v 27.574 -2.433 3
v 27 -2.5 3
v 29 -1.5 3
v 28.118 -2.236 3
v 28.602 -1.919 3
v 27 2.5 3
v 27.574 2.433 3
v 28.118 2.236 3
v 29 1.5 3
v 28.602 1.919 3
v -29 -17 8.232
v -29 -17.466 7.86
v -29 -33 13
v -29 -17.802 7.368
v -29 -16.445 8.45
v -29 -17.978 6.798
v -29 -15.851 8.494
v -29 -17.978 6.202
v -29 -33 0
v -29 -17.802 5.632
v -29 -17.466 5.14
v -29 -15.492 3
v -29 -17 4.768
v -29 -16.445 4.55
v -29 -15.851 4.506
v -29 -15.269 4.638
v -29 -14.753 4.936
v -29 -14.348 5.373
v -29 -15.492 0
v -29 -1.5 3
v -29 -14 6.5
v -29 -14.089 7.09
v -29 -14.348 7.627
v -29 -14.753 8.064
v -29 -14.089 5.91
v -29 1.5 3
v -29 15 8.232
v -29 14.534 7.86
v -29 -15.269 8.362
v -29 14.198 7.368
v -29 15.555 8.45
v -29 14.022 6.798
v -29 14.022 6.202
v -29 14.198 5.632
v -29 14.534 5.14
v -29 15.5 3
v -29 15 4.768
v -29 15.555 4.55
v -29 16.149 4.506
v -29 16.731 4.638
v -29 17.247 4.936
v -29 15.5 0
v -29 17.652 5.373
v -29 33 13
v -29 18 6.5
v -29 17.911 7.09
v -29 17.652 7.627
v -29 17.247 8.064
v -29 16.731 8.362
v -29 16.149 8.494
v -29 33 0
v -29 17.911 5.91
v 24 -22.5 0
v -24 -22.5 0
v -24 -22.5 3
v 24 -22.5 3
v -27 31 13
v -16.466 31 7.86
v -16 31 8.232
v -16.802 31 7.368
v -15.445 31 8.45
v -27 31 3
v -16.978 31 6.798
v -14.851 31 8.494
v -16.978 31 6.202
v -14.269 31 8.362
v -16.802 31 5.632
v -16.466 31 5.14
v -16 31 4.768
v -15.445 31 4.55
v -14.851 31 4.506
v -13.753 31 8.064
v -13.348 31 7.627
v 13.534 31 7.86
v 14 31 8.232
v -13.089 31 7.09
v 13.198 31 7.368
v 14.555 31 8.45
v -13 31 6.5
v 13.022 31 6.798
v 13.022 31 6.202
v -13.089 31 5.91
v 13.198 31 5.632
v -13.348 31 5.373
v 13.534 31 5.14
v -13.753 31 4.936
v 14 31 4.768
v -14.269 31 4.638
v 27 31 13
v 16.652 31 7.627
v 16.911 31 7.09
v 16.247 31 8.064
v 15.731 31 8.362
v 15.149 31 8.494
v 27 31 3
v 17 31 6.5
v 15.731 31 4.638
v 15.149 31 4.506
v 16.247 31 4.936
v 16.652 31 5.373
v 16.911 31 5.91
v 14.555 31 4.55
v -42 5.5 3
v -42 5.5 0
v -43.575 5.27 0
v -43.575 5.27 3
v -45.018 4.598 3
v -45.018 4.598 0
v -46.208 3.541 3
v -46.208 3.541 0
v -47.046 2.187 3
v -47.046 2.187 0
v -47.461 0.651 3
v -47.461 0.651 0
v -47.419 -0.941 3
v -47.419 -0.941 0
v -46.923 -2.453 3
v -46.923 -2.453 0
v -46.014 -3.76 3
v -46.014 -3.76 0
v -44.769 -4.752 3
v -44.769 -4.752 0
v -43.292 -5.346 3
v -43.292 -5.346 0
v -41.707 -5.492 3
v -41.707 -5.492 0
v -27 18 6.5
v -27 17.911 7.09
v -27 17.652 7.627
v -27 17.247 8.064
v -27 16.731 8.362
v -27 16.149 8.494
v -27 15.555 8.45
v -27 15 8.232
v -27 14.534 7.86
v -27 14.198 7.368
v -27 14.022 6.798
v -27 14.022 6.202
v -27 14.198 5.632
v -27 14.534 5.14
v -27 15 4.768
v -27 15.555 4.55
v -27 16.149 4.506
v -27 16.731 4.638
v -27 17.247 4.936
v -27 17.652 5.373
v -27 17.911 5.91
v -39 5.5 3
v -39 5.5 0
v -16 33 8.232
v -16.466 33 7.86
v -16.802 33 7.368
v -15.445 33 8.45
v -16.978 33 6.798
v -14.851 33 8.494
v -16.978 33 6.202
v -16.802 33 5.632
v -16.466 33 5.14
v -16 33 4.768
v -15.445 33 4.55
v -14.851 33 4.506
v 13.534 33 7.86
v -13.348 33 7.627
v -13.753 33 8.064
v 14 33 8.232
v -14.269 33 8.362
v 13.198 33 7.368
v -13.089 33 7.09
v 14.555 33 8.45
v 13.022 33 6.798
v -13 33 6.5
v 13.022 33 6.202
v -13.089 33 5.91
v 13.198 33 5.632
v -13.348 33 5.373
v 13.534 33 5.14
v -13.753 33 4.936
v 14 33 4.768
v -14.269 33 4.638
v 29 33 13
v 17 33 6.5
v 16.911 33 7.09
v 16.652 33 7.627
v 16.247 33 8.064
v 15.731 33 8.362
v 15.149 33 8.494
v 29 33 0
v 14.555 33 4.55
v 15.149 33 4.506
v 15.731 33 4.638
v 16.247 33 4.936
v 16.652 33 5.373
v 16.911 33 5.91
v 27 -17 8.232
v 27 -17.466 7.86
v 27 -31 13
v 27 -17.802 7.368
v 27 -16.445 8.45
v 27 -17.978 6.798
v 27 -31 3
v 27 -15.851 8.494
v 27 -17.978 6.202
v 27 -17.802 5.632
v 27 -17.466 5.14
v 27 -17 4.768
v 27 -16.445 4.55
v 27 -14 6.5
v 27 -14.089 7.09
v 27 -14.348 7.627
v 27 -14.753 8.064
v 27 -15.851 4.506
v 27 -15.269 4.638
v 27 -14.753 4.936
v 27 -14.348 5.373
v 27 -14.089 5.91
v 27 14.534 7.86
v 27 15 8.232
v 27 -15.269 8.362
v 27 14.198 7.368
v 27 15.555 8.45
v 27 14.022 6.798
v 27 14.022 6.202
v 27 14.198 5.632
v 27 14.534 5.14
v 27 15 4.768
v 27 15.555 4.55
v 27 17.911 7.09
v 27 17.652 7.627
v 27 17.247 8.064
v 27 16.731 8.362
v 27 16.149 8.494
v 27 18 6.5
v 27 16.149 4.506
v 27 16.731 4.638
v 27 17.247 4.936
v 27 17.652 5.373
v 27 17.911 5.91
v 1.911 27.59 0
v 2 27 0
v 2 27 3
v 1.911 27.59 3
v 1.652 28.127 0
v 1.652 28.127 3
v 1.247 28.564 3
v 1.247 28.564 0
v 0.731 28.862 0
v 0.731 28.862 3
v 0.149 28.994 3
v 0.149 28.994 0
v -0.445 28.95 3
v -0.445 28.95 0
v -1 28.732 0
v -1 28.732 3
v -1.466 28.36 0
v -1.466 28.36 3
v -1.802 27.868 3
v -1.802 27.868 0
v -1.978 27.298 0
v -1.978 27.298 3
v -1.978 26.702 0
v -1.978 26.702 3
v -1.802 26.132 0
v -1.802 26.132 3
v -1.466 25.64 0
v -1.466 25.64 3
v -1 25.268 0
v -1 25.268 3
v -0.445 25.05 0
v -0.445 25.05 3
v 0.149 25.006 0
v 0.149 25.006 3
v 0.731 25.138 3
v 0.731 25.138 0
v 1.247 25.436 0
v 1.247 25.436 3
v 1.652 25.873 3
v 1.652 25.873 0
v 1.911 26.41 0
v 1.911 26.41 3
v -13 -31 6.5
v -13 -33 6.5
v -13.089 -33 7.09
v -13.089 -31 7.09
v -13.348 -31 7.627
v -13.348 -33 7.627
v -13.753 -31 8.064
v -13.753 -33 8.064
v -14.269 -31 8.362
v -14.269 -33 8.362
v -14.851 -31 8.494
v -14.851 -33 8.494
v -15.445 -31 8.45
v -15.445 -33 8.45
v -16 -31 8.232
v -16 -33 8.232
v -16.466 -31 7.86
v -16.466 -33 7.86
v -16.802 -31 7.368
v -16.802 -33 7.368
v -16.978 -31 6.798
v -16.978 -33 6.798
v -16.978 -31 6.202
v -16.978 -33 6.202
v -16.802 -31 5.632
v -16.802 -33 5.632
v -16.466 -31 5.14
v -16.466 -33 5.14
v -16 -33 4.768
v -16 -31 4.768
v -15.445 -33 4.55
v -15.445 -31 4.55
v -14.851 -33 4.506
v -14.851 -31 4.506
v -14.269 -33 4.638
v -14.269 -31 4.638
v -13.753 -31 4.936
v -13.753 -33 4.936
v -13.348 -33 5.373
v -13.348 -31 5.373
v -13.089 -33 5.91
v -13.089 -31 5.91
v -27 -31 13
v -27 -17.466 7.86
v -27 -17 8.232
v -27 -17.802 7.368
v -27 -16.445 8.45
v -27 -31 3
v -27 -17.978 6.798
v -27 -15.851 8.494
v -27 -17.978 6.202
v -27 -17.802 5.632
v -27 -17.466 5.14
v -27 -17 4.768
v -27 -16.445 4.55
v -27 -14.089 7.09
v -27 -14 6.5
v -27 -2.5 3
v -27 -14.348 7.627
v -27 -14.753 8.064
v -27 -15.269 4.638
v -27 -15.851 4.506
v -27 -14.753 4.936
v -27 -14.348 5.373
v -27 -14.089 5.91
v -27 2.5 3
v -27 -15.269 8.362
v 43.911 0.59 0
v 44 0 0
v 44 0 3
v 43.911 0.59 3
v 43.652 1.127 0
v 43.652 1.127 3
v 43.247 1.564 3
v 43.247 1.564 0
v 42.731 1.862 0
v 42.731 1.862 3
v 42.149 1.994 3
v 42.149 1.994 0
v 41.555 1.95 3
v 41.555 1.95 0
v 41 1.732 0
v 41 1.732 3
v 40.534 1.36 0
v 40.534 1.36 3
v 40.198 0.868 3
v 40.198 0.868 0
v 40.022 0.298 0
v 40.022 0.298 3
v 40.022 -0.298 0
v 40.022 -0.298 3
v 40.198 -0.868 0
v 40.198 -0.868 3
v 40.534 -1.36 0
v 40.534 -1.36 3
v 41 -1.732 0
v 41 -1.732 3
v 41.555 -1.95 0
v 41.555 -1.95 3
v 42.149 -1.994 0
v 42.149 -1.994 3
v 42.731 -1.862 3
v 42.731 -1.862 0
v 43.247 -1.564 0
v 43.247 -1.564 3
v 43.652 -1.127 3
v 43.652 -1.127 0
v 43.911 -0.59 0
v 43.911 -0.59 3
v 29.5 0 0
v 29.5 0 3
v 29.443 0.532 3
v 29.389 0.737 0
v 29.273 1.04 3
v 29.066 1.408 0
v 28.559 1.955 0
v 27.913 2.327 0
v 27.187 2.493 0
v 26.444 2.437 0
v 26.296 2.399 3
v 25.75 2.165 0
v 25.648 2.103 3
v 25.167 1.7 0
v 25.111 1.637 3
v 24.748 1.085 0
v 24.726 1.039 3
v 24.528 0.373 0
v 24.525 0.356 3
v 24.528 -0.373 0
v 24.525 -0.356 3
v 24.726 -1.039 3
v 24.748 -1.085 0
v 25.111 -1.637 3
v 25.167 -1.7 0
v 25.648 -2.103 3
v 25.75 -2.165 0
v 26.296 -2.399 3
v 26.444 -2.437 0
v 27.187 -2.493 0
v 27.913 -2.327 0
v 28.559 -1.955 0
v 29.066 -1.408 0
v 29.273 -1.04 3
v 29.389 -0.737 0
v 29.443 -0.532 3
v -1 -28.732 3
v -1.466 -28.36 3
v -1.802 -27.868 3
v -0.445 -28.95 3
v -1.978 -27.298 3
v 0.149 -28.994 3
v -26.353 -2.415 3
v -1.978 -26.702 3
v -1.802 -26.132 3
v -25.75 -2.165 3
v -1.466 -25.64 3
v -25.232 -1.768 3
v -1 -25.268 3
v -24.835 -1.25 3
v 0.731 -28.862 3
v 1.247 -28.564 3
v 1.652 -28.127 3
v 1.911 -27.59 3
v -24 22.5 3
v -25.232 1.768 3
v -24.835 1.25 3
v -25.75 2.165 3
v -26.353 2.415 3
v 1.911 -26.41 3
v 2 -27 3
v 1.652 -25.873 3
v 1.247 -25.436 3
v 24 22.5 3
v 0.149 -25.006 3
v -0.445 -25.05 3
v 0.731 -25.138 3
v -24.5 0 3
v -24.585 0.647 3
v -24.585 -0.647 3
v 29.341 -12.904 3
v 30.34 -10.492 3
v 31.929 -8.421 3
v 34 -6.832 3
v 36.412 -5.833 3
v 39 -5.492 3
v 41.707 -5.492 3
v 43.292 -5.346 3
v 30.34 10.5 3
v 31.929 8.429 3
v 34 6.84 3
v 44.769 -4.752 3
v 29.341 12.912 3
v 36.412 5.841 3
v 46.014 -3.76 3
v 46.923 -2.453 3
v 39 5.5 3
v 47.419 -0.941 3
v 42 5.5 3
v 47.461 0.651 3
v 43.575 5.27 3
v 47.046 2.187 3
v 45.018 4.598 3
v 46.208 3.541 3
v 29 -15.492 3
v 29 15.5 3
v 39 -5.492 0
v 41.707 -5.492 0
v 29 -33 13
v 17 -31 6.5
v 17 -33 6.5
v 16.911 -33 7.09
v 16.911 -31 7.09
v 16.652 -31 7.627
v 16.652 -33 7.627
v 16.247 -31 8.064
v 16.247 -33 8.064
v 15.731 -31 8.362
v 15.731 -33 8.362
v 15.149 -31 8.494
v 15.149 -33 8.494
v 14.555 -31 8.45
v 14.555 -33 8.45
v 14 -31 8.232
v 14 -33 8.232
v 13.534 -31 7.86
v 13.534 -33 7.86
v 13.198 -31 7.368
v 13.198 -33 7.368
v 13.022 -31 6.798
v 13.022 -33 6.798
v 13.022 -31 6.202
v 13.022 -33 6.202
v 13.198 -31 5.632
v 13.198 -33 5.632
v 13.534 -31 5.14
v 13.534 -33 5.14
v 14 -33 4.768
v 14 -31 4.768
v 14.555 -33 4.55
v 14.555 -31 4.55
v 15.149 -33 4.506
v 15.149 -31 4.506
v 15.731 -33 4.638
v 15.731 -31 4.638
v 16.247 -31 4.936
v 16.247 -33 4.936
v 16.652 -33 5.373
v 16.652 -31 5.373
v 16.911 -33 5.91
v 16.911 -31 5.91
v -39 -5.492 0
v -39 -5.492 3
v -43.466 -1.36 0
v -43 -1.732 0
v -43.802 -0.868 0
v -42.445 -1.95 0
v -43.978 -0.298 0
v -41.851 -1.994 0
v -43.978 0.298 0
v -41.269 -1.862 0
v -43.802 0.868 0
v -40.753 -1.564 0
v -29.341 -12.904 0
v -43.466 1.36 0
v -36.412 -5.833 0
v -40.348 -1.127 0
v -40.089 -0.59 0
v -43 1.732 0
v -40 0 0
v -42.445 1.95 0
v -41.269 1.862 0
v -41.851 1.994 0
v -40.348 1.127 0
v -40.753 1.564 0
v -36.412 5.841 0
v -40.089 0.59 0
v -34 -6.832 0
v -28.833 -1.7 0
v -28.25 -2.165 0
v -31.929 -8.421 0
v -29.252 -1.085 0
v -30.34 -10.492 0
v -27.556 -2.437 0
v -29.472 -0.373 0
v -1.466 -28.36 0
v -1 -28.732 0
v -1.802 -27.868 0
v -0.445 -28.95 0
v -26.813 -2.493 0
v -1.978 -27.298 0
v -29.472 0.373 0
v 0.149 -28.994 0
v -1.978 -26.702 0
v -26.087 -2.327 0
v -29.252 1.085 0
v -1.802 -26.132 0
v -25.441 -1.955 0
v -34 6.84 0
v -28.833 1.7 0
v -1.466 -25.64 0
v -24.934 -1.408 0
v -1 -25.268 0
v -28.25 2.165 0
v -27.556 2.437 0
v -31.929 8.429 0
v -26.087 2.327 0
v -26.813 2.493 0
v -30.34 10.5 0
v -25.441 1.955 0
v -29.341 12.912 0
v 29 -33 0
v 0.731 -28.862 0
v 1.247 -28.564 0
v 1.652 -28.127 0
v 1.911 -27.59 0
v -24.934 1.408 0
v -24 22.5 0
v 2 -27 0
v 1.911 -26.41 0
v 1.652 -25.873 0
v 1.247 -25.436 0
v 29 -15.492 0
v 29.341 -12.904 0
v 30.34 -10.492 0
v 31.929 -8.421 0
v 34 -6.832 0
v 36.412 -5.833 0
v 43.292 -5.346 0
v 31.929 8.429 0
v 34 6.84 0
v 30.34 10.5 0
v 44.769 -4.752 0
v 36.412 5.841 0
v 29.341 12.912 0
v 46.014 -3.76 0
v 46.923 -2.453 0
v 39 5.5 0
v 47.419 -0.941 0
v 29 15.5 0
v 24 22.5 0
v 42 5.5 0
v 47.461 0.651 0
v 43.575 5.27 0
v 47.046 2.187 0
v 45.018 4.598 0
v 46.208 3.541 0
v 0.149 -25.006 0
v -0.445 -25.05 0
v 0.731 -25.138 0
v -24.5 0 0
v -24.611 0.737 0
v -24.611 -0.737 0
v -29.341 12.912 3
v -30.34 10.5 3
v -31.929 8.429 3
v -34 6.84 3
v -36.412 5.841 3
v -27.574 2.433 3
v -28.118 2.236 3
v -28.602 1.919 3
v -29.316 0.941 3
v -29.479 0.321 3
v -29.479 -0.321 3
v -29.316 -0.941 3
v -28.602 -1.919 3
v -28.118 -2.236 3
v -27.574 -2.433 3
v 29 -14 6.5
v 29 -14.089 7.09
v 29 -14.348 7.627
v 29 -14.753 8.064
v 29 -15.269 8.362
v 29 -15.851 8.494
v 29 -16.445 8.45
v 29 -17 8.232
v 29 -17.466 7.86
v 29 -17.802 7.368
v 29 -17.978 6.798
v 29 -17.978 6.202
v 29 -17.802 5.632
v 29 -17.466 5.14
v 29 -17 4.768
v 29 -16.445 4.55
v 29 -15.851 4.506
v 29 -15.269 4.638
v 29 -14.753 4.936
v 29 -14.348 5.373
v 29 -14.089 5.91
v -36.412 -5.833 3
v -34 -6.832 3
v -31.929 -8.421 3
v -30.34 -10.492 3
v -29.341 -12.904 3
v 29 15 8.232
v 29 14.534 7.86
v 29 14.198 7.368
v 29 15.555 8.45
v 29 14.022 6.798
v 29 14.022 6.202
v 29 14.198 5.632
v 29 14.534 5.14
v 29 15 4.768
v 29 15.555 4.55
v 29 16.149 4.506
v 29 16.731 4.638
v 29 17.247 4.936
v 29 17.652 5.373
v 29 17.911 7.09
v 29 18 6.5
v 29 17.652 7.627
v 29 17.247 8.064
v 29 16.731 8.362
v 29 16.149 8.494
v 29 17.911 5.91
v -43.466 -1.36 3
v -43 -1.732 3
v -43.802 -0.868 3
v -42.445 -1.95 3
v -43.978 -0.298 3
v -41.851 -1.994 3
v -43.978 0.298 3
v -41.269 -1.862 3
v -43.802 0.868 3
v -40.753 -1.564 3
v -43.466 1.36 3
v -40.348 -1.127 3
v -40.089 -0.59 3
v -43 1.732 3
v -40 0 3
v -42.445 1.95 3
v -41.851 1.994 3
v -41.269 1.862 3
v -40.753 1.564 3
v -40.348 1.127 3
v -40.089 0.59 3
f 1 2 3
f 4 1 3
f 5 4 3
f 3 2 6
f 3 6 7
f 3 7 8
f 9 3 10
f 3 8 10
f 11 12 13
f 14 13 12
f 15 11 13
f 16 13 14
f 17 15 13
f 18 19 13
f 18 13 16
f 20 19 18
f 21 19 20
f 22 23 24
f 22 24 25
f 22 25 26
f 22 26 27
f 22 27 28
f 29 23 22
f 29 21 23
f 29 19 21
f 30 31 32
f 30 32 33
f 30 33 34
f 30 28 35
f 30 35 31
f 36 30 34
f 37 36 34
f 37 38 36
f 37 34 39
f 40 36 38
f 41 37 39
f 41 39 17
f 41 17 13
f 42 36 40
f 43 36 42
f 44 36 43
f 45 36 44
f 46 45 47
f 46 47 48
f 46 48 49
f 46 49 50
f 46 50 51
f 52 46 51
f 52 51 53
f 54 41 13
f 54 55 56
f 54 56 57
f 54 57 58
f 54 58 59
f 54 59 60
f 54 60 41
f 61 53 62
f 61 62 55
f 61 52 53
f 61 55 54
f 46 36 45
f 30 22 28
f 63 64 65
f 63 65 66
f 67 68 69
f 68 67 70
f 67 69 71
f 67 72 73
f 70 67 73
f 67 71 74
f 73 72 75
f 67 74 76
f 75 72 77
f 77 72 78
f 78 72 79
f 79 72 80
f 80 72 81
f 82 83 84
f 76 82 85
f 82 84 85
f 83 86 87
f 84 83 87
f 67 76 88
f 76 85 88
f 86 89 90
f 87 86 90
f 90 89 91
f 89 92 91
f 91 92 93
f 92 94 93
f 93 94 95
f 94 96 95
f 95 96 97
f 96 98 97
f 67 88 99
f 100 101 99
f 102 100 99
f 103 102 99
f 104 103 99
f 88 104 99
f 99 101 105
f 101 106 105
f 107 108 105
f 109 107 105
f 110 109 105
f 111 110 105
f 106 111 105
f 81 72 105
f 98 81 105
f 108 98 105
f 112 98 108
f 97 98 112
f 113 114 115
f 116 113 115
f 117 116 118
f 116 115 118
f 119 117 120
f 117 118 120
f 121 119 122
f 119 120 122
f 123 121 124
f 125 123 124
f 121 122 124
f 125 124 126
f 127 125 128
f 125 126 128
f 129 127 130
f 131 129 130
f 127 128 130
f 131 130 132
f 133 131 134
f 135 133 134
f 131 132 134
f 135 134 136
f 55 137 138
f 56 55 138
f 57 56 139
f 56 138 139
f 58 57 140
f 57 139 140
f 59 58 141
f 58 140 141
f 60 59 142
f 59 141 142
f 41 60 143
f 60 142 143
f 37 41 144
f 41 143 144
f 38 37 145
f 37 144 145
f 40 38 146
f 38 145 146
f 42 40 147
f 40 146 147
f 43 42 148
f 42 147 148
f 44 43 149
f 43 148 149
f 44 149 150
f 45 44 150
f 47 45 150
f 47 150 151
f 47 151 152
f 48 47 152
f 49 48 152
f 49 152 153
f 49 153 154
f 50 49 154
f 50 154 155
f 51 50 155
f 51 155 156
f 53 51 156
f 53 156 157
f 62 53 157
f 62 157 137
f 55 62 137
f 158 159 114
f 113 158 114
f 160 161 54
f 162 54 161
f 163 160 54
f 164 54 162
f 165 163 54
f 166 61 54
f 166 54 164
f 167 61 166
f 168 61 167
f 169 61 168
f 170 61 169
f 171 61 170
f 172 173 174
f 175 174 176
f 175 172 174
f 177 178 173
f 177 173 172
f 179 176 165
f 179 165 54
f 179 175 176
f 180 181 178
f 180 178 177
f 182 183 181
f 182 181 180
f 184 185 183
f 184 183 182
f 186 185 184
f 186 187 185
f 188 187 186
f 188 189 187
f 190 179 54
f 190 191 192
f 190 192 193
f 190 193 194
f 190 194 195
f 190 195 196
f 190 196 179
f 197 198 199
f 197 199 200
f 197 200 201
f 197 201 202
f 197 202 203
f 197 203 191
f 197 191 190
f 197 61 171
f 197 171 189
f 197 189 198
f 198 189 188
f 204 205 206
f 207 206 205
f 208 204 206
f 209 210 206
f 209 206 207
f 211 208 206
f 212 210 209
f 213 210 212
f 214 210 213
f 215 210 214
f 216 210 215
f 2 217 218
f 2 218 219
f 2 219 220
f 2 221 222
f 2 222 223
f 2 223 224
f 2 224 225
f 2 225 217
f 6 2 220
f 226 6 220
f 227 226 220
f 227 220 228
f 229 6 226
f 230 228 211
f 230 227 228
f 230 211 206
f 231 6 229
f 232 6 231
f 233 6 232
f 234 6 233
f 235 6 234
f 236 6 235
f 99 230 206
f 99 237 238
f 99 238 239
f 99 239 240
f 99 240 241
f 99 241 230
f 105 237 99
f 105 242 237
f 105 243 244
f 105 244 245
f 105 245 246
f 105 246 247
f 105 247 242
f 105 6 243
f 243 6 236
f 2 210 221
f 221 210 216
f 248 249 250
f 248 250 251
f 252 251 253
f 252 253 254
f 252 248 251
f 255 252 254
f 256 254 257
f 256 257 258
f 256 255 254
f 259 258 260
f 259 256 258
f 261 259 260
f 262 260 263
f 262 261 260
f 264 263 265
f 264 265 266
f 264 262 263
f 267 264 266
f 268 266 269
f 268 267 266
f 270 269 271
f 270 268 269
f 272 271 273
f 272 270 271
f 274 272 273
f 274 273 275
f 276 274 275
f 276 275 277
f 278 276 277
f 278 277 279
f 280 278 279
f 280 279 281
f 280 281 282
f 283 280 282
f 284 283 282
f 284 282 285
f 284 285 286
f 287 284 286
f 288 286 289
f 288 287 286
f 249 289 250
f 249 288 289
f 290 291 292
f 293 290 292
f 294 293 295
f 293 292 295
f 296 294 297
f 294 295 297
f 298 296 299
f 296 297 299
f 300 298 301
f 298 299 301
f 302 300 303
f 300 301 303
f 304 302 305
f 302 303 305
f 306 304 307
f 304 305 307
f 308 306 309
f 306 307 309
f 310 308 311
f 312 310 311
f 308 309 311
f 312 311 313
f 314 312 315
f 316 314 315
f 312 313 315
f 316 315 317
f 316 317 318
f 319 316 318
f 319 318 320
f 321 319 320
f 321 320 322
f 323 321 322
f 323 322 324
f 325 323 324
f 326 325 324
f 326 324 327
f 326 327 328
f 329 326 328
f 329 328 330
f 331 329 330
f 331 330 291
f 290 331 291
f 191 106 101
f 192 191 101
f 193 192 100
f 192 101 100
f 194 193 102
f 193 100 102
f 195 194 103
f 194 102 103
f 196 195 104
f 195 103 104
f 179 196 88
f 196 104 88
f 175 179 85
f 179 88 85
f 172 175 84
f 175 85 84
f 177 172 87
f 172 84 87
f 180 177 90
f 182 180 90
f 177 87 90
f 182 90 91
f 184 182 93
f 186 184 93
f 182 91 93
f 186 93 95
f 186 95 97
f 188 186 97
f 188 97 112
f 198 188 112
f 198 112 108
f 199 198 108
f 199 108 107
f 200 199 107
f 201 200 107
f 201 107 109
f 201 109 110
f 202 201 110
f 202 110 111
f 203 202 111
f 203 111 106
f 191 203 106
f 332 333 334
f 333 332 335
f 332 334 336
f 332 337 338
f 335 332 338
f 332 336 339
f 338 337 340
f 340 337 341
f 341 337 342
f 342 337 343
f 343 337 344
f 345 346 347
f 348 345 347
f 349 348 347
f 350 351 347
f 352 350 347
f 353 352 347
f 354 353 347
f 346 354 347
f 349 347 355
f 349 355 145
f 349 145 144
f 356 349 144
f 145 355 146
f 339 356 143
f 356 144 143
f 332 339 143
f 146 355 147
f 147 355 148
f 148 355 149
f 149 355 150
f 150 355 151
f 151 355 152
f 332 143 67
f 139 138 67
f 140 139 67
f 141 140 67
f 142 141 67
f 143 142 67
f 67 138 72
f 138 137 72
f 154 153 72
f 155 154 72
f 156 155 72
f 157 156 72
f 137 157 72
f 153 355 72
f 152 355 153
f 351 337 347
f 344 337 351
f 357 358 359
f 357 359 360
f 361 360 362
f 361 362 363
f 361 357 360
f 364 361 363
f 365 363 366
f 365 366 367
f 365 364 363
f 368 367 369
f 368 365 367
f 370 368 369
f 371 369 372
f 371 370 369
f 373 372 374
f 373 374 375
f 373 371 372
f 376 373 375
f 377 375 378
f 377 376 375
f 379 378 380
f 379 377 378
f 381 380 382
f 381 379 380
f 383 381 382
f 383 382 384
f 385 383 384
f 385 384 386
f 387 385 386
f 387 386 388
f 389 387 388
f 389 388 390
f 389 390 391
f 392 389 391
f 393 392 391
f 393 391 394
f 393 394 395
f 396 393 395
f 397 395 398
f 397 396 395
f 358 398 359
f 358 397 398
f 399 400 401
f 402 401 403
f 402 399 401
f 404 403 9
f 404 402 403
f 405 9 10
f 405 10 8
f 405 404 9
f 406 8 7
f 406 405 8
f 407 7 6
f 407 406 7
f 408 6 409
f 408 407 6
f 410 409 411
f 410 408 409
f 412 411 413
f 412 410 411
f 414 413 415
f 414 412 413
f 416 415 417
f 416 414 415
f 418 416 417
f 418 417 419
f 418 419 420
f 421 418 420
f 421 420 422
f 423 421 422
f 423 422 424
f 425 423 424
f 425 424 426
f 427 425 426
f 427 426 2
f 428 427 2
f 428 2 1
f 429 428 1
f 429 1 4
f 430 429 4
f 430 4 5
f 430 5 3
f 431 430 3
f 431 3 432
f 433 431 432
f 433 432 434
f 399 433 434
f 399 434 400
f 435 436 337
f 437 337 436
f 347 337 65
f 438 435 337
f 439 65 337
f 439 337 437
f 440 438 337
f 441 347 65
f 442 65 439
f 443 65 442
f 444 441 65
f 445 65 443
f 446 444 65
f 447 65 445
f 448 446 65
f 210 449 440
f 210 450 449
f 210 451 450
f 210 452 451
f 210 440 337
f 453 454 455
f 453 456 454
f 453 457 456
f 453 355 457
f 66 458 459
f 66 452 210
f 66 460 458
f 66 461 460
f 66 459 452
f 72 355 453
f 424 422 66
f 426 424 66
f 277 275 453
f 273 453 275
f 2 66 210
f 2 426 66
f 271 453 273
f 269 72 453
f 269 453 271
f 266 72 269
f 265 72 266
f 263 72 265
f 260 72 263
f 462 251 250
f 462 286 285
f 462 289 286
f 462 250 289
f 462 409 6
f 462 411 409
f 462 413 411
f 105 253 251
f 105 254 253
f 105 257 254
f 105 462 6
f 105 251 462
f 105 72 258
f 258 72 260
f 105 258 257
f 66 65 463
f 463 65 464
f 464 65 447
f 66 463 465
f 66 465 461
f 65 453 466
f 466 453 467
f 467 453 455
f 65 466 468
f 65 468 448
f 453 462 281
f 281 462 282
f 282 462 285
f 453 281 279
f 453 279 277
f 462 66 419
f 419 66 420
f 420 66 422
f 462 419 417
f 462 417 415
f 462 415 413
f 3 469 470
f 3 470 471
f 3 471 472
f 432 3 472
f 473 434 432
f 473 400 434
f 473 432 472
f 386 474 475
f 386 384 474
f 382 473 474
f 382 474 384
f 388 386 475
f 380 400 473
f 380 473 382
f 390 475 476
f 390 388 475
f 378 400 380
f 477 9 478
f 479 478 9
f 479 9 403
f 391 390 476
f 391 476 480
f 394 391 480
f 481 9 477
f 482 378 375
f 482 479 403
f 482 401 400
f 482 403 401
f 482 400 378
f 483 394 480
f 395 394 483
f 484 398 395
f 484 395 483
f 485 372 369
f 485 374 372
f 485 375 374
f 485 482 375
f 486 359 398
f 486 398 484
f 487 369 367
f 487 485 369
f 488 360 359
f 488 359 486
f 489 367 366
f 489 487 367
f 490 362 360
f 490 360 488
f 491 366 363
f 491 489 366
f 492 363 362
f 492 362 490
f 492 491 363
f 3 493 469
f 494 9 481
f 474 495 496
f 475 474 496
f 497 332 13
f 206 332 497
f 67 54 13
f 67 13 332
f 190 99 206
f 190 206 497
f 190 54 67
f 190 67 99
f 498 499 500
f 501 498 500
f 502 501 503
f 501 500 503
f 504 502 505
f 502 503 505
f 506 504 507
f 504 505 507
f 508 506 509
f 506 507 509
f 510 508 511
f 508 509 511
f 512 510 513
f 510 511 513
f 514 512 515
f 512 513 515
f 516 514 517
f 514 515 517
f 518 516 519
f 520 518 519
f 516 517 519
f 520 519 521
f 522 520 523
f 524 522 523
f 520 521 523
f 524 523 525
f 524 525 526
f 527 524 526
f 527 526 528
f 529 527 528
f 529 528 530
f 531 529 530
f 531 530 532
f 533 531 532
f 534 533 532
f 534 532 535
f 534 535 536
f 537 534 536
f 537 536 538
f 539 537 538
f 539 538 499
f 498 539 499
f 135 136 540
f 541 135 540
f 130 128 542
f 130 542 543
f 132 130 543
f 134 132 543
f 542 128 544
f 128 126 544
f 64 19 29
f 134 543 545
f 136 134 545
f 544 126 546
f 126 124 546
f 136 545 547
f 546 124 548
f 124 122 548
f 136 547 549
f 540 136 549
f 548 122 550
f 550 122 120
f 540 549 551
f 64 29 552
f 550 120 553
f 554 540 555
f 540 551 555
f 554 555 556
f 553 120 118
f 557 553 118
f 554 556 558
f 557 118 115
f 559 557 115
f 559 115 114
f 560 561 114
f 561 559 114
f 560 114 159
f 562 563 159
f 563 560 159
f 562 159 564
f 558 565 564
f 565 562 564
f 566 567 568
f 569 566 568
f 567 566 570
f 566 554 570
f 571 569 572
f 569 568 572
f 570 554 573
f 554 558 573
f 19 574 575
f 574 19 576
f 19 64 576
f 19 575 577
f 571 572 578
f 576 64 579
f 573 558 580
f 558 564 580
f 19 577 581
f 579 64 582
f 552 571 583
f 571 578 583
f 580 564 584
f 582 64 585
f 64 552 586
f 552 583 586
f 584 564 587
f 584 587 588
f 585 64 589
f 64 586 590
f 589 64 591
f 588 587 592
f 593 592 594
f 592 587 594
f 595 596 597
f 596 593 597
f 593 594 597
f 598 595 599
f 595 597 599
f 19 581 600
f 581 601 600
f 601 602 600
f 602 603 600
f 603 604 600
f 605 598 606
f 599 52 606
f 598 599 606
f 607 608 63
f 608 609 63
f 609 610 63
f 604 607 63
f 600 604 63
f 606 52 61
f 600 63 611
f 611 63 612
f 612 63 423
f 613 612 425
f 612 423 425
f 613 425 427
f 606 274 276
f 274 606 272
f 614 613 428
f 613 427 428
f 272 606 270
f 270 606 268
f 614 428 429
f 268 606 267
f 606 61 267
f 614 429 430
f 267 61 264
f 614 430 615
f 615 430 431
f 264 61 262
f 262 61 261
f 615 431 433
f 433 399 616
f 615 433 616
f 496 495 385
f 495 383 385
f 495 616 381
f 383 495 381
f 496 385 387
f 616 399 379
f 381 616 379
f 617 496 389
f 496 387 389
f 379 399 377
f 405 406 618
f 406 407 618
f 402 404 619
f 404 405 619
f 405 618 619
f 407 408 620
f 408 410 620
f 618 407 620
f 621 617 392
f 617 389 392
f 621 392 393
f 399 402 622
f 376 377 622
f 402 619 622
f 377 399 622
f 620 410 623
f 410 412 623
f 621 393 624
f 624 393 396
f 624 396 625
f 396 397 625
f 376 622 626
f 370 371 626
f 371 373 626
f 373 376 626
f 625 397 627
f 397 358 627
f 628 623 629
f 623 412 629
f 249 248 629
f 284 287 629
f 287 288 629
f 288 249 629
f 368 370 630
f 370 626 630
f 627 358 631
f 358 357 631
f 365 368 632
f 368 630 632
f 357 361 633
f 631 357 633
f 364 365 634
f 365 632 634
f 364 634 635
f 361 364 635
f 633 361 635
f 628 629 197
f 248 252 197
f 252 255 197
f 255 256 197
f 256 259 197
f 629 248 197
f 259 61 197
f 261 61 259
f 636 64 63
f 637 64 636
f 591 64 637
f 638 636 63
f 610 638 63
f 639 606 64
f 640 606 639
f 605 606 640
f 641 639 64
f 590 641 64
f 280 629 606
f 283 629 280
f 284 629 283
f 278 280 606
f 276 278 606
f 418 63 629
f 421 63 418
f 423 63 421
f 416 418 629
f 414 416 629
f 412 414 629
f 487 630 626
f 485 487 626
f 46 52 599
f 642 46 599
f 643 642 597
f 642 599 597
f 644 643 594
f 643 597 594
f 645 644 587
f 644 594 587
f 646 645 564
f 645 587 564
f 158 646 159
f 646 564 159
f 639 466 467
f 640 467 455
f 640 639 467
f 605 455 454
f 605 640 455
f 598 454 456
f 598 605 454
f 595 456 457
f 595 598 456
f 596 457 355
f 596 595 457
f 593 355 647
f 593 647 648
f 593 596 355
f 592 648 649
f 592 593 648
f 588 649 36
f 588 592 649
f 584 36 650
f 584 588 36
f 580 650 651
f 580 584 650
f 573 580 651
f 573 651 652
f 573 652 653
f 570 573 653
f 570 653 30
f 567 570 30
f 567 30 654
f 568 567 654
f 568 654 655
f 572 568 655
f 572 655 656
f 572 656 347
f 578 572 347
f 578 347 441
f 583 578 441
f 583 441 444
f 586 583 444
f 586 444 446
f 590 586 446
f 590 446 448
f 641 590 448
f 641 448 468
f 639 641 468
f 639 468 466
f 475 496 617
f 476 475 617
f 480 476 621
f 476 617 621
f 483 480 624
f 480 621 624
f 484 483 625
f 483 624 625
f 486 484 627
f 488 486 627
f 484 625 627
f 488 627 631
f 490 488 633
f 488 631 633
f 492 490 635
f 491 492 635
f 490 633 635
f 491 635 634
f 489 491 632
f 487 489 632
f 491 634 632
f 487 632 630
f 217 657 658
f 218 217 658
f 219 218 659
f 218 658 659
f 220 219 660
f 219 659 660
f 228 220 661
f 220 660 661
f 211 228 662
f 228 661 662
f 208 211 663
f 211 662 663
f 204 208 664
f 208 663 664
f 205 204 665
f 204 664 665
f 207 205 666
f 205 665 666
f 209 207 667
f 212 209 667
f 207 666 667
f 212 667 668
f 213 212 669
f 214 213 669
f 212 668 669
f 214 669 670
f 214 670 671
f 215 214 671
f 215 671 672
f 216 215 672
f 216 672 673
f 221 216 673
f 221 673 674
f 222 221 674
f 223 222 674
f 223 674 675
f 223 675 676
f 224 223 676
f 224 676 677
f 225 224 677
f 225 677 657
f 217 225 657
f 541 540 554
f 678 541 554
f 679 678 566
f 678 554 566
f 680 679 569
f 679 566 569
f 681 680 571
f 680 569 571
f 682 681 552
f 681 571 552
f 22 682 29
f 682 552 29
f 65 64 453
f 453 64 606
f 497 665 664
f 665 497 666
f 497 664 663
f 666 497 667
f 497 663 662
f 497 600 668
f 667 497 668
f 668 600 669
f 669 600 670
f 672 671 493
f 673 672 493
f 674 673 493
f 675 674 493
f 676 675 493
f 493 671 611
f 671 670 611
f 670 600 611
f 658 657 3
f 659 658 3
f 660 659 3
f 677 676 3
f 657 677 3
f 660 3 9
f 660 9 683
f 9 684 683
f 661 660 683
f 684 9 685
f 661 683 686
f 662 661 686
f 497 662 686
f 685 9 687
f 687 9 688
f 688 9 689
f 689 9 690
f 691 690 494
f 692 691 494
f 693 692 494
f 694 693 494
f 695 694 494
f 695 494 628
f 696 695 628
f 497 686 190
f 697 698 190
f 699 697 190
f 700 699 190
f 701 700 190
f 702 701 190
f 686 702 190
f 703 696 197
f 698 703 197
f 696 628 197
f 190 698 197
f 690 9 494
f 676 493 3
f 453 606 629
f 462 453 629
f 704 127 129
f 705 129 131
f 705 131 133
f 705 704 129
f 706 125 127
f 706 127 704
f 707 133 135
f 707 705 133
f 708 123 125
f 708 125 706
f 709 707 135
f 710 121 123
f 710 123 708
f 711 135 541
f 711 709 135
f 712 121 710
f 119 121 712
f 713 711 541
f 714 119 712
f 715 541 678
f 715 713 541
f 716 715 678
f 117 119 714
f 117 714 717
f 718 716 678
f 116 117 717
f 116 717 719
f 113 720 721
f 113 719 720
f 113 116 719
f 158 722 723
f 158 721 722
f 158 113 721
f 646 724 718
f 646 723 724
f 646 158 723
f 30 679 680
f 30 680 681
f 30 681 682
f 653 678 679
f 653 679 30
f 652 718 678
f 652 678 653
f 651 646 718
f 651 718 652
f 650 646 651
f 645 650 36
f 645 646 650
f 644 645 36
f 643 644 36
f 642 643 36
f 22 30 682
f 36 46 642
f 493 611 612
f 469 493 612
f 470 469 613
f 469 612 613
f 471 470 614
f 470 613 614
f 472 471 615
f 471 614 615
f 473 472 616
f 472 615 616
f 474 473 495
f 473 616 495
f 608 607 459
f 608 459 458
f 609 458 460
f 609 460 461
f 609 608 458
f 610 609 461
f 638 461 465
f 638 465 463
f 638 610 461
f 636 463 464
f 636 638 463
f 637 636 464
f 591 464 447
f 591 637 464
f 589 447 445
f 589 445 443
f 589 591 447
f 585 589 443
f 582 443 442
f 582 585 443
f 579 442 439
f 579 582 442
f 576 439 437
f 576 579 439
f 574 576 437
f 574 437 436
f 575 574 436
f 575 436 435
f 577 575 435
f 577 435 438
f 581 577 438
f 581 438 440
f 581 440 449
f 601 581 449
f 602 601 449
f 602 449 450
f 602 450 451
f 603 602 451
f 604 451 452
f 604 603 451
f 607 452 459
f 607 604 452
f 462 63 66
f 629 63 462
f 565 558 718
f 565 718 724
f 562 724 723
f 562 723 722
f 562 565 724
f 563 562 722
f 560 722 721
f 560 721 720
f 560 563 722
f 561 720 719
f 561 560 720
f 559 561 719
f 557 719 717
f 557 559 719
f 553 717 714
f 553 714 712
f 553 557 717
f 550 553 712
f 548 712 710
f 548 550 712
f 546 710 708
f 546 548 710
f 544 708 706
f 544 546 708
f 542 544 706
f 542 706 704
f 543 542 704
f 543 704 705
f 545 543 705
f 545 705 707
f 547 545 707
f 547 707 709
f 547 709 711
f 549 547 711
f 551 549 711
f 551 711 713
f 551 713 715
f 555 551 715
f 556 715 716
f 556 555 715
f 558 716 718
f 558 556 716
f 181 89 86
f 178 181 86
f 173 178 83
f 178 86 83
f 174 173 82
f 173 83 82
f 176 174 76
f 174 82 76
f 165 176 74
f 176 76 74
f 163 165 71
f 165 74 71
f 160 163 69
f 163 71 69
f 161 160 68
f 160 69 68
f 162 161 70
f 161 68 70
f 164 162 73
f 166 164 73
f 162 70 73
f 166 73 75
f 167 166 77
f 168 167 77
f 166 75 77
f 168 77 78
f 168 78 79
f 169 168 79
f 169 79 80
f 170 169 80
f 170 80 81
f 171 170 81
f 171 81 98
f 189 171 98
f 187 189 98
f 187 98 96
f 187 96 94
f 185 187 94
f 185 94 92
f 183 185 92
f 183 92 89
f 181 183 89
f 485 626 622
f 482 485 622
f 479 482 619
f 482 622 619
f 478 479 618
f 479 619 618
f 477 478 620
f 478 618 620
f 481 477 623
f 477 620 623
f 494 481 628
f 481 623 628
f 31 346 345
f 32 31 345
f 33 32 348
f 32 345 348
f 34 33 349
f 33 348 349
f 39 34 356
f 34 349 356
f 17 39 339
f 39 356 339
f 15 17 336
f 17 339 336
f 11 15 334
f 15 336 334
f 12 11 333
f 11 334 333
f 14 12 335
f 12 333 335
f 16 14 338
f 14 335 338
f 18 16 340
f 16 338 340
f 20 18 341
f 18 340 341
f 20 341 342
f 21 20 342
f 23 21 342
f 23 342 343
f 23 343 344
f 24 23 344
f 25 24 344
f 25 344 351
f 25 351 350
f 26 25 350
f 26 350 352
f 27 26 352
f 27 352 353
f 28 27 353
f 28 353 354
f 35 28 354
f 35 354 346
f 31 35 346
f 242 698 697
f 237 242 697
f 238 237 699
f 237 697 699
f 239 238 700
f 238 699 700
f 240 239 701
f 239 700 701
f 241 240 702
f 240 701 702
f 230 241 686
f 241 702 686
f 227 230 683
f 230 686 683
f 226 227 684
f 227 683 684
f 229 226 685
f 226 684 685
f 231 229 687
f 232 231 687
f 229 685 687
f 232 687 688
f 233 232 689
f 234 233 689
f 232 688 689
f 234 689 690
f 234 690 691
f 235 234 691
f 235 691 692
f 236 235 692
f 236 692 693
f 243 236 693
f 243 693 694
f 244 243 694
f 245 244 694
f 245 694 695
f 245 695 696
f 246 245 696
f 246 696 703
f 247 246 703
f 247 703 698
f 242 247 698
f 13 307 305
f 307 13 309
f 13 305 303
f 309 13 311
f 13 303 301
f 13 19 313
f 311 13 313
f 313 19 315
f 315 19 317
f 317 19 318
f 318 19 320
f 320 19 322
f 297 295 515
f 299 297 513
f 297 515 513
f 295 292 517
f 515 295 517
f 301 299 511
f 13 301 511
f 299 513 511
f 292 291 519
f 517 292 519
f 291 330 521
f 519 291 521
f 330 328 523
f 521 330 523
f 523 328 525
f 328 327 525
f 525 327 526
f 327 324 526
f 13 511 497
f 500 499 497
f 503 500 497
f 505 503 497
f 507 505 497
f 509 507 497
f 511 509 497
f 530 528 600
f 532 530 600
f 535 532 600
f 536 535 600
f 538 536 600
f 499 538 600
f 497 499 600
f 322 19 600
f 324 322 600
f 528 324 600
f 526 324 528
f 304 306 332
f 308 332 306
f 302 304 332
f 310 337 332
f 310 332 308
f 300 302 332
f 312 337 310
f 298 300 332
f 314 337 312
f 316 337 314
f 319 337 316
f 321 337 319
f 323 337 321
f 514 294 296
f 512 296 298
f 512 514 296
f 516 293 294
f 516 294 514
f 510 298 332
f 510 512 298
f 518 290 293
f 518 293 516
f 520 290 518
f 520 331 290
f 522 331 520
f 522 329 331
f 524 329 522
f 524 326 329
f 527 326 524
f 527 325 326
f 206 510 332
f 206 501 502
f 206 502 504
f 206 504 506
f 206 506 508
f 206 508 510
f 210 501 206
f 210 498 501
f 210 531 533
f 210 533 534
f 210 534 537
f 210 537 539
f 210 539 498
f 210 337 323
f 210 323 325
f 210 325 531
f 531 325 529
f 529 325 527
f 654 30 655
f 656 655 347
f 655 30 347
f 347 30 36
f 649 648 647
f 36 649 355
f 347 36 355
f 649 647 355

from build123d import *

# Parameters (mm, degrees)
F0_R     = 2
F0_R_2   = 2.5
F0_W     = 48
F0_H     = 45
F1_DEPTH = 3
F2_W     = 58
F2_H     = 66
F2_W_2   = 54
F2_H_2   = 62
F3_DEPTH = 10
F4_R     = 2
F5_DEPTH = 150
F6_R     = 2
F7_DEPTH = 150


with BuildPart() as f1:
    # F0 (on Top) → F1 (new body)
    with BuildSketch(Plane.XY):
        with BuildLine():
            Line((-29, -33), (29, -33))
            Line((29, -33), (29, -15.492203))
            ThreePointArc((29, -15.492203), (31.928932, -8.421135), (39, -5.492203))
            Line((39, -5.492203), (41.707241, -5.492203))
            ThreePointArc((41.707241, -5.492203), (47.49805, -0.146431), (42, 5.5))
            Line((42, 5.5), (39, 5.5))
            ThreePointArc((39, 5.5), (31.928932, 8.428932), (29, 15.5))
            Line((29, 15.5), (29, 33))
            Line((29, 33), (-29, 33))
            Line((-29, 33), (-29, 15.5))
            ThreePointArc((-29, 15.5), (-31.928932, 8.428932), (-39, 5.5))
            Line((-39, 5.5), (-42, 5.5))
            ThreePointArc((-42, 5.5), (-47.49805, -0.146431), (-41.707241, -5.492203))
            Line((-41.707241, -5.492203), (-39, -5.492203))
            ThreePointArc((-39, -5.492203), (-31.928932, -8.421135), (-29, -15.492203))
            Line((-29, -15.492203), (-29, -33))
        make_face()
        with Locations((0, -27)):
            Circle(F0_R, mode=Mode.SUBTRACT)
        with Locations((-42, 0)):
            Circle(F0_R, mode=Mode.SUBTRACT)
        with Locations((-27, 0)):
            Circle(F0_R_2, mode=Mode.SUBTRACT)
        Rectangle(F0_W, F0_H, mode=Mode.SUBTRACT)
        with Locations((27, 0)):
            Circle(F0_R_2, mode=Mode.SUBTRACT)
        with Locations((42, 0)):
            Circle(F0_R, mode=Mode.SUBTRACT)
        with Locations((0, 27)):
            Circle(F0_R, mode=Mode.SUBTRACT)
    extrude(amount=F1_DEPTH)

    # F2 (on face) → F3 (join)
    with BuildSketch(Plane.XY.offset(3)):
        Rectangle(F2_W, F2_H)
        Rectangle(F2_W_2, F2_H_2, mode=Mode.SUBTRACT)
    extrude(amount=F3_DEPTH)

    # F4 (on face) → F5 (cut)
    with BuildSketch(Plane.XZ.offset(33)):
        with Locations((-15, 6.5)):
            Circle(F4_R)
        with Locations((15, 6.5)):
            Circle(F4_R)
    extrude(amount=-F5_DEPTH, mode=Mode.SUBTRACT)

    # F6 (on face) → F7 (cut)
    with BuildSketch(Plane.YZ.offset(29)):
        with Locations((-16, 6.5)):
            Circle(F6_R)
        with Locations((16, 6.5)):
            Circle(F6_R)
    extrude(amount=-F7_DEPTH, mode=Mode.SUBTRACT)


solid = f1.part
